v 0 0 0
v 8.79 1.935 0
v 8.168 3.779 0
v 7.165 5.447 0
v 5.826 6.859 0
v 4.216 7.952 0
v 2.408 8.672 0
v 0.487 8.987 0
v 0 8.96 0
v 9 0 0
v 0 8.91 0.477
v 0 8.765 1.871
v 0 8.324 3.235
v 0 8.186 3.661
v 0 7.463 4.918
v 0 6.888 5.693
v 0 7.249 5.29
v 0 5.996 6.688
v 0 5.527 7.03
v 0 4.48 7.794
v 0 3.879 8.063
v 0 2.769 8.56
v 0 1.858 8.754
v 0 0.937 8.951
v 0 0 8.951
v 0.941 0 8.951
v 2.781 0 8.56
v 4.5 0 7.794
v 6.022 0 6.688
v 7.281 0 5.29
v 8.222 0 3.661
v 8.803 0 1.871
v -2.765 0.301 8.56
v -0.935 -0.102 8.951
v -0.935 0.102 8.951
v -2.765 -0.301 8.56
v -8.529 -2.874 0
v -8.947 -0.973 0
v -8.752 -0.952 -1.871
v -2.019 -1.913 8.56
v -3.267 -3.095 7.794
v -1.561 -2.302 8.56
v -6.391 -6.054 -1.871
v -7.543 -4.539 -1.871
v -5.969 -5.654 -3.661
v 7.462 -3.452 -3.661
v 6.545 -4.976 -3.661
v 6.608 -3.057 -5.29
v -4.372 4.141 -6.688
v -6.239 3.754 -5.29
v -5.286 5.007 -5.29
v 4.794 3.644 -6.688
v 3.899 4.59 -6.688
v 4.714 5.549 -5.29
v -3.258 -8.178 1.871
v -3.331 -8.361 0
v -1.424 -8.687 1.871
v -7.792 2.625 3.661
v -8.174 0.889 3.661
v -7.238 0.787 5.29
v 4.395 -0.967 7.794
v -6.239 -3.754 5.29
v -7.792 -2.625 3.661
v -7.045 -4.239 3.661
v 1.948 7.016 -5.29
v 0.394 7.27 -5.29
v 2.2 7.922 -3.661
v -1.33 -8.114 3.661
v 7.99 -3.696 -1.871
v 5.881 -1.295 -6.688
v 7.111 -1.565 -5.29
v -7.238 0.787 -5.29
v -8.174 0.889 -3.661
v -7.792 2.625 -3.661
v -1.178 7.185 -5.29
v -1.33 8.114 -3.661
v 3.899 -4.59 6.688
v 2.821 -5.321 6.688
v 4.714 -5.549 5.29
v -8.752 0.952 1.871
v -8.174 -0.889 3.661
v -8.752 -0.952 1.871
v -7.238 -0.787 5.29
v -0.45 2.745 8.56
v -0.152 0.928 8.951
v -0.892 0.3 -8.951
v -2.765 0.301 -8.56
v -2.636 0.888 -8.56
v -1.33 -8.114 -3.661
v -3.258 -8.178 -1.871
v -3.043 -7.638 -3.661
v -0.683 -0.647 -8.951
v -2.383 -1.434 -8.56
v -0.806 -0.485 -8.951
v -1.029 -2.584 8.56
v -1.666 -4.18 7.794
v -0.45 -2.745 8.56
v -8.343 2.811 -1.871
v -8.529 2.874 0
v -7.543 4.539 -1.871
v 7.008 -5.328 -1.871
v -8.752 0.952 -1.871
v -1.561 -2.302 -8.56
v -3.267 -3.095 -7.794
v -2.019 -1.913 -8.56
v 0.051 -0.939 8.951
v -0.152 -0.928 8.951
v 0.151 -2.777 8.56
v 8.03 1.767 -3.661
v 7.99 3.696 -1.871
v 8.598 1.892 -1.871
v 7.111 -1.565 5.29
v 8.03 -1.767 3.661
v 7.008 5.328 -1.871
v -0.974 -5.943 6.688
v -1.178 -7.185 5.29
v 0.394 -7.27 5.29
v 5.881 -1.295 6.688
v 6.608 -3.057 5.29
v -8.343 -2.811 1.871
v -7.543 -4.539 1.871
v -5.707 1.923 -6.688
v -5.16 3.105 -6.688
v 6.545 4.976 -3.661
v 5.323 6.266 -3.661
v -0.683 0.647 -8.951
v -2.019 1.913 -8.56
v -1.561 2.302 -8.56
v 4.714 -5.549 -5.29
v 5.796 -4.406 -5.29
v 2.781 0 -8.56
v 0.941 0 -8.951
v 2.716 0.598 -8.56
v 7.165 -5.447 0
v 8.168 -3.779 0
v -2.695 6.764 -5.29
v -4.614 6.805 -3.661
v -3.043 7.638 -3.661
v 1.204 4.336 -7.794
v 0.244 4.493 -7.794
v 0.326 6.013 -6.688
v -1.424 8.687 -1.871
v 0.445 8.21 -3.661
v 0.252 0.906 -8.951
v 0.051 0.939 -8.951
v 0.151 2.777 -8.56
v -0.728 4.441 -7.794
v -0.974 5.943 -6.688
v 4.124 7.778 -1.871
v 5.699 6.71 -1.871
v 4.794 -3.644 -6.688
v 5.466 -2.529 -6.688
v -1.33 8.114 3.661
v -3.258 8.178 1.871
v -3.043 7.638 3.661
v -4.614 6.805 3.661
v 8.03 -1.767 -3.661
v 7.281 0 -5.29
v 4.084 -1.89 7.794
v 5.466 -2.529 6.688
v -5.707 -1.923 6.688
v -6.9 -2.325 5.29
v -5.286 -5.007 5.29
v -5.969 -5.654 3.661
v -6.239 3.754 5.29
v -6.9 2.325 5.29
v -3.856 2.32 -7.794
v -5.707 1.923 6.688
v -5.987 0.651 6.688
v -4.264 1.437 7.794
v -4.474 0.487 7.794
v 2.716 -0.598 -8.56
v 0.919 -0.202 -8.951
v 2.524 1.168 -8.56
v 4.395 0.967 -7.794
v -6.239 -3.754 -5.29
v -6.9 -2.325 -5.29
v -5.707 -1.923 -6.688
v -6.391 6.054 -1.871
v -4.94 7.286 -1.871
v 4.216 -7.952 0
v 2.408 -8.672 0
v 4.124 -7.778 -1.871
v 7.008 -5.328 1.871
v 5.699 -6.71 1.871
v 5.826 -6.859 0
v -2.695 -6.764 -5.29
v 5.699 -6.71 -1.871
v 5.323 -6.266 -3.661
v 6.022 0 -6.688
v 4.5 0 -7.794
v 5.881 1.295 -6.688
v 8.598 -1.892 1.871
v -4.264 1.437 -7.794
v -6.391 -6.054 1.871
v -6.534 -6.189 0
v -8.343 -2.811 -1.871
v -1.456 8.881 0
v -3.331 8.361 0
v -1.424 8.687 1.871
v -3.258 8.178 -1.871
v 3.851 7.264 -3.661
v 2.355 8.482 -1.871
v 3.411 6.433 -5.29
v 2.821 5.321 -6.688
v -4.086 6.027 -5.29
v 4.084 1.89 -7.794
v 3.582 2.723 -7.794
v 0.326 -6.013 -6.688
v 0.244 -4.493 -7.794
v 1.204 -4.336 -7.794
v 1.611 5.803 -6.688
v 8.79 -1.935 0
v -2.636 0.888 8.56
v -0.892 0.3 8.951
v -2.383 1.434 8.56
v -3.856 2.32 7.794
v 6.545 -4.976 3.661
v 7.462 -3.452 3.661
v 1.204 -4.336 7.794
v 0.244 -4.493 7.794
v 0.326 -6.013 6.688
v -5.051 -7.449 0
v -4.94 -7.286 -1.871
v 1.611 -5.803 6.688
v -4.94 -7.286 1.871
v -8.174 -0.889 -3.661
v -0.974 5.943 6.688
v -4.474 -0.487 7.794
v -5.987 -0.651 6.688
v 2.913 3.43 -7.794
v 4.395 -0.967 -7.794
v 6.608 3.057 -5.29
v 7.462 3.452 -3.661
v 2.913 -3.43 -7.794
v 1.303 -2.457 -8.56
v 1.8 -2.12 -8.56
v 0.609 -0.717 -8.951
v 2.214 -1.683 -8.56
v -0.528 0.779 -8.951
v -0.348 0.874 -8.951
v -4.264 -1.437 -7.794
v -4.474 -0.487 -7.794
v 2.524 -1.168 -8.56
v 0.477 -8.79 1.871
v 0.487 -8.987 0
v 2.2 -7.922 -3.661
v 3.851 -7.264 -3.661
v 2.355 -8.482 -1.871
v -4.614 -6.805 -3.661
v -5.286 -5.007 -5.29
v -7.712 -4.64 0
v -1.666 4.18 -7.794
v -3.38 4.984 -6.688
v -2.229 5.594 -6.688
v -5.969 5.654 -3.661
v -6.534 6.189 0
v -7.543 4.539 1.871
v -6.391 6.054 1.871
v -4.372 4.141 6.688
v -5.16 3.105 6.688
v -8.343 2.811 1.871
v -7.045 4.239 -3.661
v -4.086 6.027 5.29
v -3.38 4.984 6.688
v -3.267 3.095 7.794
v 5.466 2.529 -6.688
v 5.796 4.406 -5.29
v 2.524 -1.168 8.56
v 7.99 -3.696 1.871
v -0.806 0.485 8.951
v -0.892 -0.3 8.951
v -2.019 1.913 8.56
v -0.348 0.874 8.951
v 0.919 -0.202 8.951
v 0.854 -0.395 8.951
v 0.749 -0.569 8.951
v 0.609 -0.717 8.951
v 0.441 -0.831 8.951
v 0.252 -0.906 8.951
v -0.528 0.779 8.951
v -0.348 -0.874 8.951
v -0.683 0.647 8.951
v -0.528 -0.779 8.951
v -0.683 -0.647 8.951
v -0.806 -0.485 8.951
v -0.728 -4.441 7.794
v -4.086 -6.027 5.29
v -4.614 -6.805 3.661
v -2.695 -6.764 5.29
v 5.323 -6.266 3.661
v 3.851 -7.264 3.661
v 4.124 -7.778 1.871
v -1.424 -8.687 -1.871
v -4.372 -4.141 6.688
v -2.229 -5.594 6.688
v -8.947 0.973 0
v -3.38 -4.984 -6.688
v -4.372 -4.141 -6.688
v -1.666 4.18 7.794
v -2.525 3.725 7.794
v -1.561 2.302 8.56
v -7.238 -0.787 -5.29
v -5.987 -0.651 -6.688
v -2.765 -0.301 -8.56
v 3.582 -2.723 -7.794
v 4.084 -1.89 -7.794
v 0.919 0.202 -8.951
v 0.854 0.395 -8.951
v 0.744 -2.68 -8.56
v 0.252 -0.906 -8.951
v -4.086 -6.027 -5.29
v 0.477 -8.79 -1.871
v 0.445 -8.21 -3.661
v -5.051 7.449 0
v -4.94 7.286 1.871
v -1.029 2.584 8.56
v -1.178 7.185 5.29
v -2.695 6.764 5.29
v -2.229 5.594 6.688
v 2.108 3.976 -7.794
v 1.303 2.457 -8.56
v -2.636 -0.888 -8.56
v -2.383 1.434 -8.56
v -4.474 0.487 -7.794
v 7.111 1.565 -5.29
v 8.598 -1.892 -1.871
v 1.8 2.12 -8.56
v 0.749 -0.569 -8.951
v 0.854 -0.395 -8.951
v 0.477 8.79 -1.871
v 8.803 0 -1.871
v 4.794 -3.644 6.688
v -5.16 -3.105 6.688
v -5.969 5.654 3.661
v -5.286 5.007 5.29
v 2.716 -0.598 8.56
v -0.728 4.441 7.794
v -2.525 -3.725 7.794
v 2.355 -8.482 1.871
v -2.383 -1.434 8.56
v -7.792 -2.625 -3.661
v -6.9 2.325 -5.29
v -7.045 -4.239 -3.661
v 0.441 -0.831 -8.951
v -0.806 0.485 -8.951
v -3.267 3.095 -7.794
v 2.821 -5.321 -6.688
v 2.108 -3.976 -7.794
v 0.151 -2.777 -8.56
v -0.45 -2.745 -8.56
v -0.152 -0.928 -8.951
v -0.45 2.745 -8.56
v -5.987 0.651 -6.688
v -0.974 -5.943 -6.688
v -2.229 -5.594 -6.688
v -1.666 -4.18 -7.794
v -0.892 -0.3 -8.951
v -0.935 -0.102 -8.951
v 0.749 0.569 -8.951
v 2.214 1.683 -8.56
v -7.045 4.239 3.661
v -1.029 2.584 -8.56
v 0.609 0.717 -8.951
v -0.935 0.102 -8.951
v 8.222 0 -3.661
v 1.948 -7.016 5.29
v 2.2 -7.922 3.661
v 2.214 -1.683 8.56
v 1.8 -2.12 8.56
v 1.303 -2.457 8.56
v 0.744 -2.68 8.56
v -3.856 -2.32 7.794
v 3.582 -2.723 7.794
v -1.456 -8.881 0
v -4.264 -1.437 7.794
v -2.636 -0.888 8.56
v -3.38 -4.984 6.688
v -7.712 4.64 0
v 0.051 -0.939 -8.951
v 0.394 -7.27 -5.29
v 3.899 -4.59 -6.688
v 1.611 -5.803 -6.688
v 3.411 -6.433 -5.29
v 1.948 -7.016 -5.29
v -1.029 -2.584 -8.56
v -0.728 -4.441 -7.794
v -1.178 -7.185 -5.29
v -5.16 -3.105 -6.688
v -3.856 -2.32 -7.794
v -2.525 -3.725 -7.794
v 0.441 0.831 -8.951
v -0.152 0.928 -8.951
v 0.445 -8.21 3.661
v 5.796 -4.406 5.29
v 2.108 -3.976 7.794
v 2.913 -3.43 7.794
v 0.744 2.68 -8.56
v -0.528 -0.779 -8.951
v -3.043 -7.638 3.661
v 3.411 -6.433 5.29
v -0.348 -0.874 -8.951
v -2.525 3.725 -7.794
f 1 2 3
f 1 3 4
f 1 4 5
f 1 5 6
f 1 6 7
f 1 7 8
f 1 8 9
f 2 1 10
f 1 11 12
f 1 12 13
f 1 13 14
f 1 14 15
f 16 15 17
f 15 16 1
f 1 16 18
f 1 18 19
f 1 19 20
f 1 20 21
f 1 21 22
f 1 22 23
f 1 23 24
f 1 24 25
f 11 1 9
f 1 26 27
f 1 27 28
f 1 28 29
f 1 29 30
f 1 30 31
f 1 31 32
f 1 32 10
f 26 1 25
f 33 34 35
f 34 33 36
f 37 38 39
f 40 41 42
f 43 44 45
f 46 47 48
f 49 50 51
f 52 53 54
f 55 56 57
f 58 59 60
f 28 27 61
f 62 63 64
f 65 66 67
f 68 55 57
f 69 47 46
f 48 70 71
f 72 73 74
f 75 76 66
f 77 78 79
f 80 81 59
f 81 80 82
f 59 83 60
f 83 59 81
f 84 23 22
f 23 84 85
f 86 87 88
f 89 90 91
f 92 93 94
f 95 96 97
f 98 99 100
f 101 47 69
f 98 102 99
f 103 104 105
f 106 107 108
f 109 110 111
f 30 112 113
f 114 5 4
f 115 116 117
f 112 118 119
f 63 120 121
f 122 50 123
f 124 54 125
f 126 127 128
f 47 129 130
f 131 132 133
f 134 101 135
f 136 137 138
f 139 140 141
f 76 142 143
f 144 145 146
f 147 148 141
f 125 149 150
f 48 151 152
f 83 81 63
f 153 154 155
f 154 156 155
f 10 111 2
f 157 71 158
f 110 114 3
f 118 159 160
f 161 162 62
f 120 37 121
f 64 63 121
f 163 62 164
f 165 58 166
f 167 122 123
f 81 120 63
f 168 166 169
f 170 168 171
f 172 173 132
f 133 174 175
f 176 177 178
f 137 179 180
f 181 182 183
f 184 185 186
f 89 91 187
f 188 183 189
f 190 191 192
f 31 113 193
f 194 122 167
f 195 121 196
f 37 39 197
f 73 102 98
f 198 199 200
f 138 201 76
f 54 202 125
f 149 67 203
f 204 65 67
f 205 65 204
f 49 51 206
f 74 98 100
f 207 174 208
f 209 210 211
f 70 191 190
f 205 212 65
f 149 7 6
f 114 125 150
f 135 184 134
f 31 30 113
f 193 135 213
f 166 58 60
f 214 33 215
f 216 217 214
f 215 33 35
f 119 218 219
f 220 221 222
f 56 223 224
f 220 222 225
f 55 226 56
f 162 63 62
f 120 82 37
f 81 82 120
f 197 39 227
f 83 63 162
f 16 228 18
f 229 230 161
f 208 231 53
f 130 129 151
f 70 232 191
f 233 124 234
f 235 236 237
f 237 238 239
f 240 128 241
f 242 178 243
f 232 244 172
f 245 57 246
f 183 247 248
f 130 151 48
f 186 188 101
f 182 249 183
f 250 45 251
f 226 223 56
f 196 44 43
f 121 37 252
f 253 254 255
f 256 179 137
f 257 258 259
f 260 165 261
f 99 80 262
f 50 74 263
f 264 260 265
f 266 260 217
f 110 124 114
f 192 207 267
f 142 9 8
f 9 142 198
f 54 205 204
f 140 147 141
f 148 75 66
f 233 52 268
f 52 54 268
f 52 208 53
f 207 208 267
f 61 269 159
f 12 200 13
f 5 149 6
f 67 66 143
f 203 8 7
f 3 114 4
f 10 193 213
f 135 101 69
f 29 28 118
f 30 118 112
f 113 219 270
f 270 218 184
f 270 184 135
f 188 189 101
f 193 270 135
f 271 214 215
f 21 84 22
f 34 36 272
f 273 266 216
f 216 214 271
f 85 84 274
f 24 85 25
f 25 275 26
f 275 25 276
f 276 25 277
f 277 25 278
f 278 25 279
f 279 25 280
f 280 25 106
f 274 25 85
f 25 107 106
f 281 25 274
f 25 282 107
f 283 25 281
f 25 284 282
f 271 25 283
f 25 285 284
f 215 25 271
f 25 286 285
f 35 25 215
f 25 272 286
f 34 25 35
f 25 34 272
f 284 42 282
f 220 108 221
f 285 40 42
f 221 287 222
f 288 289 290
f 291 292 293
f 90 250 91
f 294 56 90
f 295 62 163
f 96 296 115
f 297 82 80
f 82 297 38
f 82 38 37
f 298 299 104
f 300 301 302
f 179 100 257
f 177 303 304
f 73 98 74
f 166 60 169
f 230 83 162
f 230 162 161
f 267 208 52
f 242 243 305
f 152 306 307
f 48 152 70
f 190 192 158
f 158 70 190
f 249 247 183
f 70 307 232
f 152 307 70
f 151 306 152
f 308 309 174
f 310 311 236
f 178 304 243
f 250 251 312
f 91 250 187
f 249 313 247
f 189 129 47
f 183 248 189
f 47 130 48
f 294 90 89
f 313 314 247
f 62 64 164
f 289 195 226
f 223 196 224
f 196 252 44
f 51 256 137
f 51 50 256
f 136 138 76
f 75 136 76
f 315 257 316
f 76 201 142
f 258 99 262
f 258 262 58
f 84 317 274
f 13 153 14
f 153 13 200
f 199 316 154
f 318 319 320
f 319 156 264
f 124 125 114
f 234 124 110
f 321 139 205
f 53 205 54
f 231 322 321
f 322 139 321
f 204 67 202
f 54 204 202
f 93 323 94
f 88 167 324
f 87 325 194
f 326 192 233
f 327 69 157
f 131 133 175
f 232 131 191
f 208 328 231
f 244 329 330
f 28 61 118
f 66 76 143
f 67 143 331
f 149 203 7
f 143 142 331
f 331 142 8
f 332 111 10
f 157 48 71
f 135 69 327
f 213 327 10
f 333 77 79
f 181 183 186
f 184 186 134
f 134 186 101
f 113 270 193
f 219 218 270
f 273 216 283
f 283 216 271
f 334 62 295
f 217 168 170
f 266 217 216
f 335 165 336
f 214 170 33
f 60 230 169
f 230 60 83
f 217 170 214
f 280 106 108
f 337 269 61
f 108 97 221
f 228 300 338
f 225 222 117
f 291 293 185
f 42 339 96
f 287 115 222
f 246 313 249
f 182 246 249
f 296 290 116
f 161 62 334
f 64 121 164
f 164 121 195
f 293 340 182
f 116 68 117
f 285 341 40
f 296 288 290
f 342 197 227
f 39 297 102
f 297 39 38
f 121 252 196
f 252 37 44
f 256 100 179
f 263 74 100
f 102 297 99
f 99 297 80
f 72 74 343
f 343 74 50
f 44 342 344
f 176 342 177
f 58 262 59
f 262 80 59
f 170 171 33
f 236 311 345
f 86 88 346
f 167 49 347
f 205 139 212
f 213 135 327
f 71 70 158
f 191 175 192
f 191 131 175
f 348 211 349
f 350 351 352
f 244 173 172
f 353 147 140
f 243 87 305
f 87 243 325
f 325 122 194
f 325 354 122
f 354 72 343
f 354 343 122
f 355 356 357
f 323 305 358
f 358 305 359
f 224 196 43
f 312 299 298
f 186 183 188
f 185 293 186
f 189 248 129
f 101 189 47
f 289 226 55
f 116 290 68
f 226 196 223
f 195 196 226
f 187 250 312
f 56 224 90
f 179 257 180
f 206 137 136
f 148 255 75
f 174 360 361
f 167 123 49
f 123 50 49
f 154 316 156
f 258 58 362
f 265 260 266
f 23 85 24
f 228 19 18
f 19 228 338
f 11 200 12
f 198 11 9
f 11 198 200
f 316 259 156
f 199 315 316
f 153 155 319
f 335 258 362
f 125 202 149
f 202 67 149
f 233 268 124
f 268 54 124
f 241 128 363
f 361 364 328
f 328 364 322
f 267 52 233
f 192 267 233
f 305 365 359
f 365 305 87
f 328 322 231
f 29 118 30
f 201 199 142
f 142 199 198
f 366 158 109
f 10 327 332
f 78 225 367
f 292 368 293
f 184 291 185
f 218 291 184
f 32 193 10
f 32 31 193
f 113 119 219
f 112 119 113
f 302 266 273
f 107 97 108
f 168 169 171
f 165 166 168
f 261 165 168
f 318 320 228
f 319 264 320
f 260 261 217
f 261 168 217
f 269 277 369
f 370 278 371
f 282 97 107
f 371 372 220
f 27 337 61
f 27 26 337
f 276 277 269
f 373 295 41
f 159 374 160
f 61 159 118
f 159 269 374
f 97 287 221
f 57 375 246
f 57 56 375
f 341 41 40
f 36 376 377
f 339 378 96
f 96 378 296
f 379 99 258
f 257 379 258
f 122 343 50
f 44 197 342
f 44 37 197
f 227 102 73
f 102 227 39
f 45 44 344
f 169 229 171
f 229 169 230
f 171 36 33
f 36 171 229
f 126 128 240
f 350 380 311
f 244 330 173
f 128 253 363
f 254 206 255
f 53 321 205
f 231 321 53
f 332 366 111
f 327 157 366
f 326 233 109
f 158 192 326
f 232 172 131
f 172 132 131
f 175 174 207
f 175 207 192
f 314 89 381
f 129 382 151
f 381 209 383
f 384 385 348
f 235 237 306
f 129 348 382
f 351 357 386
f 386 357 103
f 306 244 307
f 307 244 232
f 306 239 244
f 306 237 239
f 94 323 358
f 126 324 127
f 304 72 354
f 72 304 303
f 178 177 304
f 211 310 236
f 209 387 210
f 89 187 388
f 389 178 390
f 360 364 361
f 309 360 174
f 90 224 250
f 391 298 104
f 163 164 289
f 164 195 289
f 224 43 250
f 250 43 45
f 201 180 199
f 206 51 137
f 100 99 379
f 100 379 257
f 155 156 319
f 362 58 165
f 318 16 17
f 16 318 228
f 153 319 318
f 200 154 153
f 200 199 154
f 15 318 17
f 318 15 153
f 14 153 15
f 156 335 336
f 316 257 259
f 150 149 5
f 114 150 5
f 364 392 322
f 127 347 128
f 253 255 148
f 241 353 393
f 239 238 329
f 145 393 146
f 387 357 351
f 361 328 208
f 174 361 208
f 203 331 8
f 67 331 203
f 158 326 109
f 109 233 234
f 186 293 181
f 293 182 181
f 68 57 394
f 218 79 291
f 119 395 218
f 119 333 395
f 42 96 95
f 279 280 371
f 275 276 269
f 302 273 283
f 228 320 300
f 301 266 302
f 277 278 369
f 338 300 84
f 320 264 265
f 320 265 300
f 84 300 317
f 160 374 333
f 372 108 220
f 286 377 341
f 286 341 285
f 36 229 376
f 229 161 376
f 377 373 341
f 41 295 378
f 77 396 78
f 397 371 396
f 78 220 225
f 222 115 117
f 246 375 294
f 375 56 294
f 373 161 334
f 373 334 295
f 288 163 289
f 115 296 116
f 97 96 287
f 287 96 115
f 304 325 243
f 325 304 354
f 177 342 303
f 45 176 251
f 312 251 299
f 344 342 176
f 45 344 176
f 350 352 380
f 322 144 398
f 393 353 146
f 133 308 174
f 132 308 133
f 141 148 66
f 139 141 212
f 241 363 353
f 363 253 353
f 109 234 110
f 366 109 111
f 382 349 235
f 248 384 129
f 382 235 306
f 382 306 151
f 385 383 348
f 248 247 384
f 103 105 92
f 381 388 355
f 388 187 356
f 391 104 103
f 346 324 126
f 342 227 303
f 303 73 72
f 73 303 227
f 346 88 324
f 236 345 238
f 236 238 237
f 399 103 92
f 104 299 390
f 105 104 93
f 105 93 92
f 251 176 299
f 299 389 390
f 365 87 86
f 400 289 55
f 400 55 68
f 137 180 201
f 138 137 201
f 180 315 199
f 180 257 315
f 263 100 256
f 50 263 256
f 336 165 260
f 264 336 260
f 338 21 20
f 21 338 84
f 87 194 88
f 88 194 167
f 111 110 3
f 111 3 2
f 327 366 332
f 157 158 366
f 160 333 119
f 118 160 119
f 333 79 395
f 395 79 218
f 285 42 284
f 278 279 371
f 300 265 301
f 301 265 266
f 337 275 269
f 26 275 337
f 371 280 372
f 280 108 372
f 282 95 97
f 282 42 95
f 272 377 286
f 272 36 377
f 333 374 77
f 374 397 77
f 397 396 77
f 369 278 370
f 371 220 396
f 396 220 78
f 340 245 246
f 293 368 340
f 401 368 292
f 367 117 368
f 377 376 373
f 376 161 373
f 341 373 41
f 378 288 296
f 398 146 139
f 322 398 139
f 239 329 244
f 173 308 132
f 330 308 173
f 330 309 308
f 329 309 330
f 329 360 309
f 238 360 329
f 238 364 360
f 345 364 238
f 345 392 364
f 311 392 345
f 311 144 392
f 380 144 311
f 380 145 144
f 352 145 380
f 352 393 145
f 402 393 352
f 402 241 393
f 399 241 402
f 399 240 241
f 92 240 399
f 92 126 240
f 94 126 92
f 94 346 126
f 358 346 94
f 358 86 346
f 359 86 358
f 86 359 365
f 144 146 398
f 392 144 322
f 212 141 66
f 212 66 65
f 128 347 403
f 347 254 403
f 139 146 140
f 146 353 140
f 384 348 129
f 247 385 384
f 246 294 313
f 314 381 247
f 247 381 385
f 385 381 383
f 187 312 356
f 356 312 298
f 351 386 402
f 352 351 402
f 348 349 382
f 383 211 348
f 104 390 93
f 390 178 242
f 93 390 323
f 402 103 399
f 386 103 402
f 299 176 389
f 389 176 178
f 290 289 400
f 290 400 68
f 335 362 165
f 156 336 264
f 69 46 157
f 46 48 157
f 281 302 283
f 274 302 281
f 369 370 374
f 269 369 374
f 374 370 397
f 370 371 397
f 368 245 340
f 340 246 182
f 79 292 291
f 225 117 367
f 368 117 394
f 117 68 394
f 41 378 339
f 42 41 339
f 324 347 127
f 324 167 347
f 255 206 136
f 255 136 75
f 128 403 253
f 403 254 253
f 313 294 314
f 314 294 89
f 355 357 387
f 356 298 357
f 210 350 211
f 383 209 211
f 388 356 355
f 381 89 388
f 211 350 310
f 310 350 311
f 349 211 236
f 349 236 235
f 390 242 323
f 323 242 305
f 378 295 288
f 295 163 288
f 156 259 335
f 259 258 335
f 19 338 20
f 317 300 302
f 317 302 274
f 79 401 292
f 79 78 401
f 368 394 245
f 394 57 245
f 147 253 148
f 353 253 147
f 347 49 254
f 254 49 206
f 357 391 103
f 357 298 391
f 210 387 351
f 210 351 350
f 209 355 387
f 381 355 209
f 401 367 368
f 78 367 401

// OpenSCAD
difference(){
    sphere(r=9);
    union(){
        cube(size=[10, 20, 10]);
        cube(size=[20, 10, 10]);
    };
};
